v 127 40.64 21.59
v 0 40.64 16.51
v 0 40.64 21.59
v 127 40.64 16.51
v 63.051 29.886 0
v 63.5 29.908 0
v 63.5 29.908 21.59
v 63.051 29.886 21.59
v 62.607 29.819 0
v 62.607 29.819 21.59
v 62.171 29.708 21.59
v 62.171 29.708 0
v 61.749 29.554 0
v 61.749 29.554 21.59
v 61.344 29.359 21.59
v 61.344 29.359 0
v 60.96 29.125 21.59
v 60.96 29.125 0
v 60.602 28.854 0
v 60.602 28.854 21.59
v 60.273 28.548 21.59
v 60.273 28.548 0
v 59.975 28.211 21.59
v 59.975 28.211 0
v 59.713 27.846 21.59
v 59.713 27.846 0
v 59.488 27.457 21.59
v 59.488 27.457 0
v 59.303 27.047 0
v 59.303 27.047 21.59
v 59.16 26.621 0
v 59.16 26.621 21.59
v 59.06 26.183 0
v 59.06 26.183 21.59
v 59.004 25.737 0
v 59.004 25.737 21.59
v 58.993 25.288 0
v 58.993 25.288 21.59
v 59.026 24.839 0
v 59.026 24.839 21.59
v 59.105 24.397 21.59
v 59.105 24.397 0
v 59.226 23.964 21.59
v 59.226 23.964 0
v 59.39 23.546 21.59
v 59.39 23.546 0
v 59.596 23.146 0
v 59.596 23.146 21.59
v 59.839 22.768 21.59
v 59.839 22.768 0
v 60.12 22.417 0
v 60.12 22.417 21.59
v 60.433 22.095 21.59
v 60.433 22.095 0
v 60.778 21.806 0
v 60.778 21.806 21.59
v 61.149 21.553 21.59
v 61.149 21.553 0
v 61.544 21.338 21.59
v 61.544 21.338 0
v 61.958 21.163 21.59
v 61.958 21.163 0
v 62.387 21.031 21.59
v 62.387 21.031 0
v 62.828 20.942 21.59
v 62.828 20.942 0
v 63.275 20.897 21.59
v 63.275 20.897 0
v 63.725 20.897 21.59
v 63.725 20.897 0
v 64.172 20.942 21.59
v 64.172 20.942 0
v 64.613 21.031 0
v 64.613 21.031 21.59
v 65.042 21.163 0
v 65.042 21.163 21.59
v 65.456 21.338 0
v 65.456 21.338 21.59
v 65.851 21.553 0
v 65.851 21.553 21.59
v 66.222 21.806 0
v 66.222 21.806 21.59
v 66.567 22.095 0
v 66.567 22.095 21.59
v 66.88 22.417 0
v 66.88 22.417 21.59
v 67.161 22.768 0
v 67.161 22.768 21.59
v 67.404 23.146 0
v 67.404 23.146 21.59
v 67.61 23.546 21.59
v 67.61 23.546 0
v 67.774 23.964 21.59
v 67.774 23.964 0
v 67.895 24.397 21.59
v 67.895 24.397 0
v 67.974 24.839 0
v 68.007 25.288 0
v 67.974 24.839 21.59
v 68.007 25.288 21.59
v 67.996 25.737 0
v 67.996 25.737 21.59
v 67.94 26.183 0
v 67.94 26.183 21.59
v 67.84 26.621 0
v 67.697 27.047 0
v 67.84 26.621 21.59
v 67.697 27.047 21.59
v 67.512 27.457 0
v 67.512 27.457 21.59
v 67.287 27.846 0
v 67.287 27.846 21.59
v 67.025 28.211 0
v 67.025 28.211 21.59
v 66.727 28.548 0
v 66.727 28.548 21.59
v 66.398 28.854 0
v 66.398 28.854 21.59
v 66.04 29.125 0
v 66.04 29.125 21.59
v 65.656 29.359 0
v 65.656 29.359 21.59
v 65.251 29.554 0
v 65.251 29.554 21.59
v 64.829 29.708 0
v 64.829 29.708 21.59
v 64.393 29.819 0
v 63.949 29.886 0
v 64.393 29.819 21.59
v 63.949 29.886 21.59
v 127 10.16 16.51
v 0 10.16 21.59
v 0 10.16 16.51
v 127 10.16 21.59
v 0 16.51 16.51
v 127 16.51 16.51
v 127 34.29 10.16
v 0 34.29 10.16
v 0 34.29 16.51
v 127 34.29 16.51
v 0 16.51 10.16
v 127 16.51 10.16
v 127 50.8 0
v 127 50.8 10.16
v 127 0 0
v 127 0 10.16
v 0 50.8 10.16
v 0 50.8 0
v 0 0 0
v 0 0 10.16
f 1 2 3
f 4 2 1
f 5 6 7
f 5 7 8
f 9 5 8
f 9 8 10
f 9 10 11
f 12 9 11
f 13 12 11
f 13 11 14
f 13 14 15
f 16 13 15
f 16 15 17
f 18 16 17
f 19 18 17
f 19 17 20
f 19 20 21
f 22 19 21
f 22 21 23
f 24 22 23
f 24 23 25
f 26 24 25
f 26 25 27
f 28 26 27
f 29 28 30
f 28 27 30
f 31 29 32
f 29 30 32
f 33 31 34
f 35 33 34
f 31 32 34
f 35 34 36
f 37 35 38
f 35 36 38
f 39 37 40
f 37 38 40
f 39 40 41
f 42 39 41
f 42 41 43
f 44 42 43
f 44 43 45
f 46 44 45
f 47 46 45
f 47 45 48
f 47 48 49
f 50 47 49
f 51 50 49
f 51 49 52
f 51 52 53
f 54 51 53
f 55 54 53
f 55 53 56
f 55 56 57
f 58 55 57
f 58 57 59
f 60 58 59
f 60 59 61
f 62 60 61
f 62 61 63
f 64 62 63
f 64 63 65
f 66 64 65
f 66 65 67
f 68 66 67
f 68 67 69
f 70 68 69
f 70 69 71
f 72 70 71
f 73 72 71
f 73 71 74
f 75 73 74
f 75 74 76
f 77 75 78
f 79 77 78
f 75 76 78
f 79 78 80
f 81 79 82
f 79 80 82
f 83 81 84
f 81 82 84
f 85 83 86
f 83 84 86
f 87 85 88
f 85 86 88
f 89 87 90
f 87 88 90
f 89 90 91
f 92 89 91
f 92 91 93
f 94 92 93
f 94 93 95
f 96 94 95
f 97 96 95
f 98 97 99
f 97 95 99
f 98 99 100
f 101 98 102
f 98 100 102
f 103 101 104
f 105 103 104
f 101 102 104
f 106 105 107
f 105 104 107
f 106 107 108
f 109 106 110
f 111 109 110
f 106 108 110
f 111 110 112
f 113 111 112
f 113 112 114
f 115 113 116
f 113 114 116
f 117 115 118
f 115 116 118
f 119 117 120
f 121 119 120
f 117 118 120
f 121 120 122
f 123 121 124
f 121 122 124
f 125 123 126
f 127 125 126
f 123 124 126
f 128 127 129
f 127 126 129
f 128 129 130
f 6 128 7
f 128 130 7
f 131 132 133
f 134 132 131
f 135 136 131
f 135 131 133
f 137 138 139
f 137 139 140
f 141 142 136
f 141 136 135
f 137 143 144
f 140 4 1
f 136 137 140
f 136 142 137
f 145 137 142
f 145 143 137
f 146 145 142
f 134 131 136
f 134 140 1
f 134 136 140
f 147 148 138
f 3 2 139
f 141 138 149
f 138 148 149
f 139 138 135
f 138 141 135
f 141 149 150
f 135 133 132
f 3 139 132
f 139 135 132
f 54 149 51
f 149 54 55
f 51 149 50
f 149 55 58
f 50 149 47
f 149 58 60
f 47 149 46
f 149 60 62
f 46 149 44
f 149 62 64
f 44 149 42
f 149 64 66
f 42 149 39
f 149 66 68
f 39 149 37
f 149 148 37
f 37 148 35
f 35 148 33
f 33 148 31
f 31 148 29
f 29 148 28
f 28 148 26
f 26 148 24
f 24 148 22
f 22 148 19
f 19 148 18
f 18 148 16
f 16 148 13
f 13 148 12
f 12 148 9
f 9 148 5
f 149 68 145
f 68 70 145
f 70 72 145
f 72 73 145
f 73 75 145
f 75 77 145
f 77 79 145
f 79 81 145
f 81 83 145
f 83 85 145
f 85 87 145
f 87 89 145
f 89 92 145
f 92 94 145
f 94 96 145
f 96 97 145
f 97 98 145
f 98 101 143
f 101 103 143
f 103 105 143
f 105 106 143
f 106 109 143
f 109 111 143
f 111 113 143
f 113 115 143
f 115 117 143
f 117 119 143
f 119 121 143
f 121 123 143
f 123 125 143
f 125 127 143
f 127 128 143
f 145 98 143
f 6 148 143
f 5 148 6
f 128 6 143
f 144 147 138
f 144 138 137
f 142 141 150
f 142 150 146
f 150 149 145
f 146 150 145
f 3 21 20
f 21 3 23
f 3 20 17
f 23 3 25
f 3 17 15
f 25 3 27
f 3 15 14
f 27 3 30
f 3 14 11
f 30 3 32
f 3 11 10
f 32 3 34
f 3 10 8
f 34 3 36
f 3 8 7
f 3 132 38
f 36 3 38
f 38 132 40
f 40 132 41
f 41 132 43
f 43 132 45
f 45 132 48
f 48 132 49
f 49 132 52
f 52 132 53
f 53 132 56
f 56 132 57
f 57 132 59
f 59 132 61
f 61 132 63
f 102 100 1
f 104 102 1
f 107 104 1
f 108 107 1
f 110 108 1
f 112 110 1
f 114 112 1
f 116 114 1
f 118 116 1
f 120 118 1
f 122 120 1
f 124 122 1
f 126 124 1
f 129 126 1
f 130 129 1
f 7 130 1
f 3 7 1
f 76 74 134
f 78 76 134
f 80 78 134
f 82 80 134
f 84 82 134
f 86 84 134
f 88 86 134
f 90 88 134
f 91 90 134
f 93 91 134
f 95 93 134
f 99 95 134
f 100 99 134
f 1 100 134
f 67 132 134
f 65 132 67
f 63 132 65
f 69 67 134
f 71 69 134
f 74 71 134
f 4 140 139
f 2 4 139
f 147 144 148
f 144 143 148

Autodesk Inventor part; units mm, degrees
ref_plane "YZ Plane" through (0, 0, 0) normal (1, 0, 0) x (0, 1, 0)
ref_plane "XZ Plane" through (0, 0, 0) normal (0, 1, 0) x (-1, 0, 0)
ref_plane "XY Plane" through (0, 0, 0) normal (0, 0, 1) x (1, 0, 0)
sketch "Sketch1" plane through (0, 0, 0) normal (0, 0, 1) x (1, 0, 0)
  line L0 (0, 0) -> (127, 0)
  line L1 (127, 0) -> (127, 50.8)
  line L2 (127, 50.8) -> (0, 50.8)
  line L3 (0, 50.8) -> (0, 0)
  dimension "d0" = 50.8
  dimension "d1" = 127
extrude "Extrusion1" add sketch "Sketch1" along normal blind 10.16
sketch "Sketch2" plane through (0, 0, 10.16) normal (0, 0, 1) x (1, 0, 0)
  line L0 (0, 50.8) -> (0, 0) projected
  line L1 (127, 0) -> (127, 50.8) projected
  line L2 (0, 34.29) -> (127, 34.29)
  line L3 (127, 34.29) -> (127, 16.51)
  line L4 (127, 16.51) -> (0, 16.51)
  line L5 (0, 16.51) -> (0, 34.29)
  line L6 (127, 50.8) -> (0, 50.8) projected
  point P0 (0, 16.51)
  dimension "d4" = 17.78
  dimension "d5" = 16.51
extrude "Extrusion2" add sketch "Sketch2" along normal blind 11.43 contours L2 L1 L4 L0
sketch "Sketch4" plane through (0, 34.29, 10.16) normal (0, 1, 0) x (1, 0, 0)
  line L0 (0, 0) -> (0, -11.43) projected
  line L1 (127, 0) -> (127, -11.43) projected
  line L2 (0, -11.43) -> (127, -11.43)
  line L3 (127, -11.43) -> (127, -6.35)
  line L4 (127, -6.35) -> (0, -6.35)
  line L5 (0, -6.35) -> (0, -11.43)
  point P0 (0, 10.16)
  point P1 (0, -6.35)
  dimension "d10" = 5.08
sketch "Sketch5" plane through (0, 16.51, 10.16) normal (0, -1, 0) x (1, 0, 0)
  line L0 (0, 0) -> (0, 11.43) projected
  line L1 (127, 0) -> (127, 11.43) projected
  line L2 (0, 11.43) -> (127, 11.43)
  line L3 (127, 11.43) -> (127, 6.35)
  line L4 (127, 6.35) -> (0, 6.35)
  line L5 (0, 6.35) -> (0, 11.43)
  point P0 (0, -10.16)
  point P1 (0, 6.35)
  dimension "d11" = 5.08
extrude "Extrusion3" add sketch "Sketch5" along normal blind 6.35
extrude "Extrusion4" add sketch "Sketch4" along normal blind 6.35
sketch "Sketch6" plane through (0, 0, 0) normal (0, 0, -1) x (-1, 0, 0)
  circle A0 centre (-63.5, 25.4) radius 5.08
  line L0 (0, 50.8) -> (0, 0) projected
  line L1 (0, 0) -> (-127, 0) projected
  dimension "d16" = 10.16
  dimension "d17" = 63.5
  dimension "d18" = 25.4
hole "Hole1" at (63.5, 25.4, 0) direction (0, 0, 1) diameter 9.017 end through all
properties part number "jeep pvc connect on pvc"
